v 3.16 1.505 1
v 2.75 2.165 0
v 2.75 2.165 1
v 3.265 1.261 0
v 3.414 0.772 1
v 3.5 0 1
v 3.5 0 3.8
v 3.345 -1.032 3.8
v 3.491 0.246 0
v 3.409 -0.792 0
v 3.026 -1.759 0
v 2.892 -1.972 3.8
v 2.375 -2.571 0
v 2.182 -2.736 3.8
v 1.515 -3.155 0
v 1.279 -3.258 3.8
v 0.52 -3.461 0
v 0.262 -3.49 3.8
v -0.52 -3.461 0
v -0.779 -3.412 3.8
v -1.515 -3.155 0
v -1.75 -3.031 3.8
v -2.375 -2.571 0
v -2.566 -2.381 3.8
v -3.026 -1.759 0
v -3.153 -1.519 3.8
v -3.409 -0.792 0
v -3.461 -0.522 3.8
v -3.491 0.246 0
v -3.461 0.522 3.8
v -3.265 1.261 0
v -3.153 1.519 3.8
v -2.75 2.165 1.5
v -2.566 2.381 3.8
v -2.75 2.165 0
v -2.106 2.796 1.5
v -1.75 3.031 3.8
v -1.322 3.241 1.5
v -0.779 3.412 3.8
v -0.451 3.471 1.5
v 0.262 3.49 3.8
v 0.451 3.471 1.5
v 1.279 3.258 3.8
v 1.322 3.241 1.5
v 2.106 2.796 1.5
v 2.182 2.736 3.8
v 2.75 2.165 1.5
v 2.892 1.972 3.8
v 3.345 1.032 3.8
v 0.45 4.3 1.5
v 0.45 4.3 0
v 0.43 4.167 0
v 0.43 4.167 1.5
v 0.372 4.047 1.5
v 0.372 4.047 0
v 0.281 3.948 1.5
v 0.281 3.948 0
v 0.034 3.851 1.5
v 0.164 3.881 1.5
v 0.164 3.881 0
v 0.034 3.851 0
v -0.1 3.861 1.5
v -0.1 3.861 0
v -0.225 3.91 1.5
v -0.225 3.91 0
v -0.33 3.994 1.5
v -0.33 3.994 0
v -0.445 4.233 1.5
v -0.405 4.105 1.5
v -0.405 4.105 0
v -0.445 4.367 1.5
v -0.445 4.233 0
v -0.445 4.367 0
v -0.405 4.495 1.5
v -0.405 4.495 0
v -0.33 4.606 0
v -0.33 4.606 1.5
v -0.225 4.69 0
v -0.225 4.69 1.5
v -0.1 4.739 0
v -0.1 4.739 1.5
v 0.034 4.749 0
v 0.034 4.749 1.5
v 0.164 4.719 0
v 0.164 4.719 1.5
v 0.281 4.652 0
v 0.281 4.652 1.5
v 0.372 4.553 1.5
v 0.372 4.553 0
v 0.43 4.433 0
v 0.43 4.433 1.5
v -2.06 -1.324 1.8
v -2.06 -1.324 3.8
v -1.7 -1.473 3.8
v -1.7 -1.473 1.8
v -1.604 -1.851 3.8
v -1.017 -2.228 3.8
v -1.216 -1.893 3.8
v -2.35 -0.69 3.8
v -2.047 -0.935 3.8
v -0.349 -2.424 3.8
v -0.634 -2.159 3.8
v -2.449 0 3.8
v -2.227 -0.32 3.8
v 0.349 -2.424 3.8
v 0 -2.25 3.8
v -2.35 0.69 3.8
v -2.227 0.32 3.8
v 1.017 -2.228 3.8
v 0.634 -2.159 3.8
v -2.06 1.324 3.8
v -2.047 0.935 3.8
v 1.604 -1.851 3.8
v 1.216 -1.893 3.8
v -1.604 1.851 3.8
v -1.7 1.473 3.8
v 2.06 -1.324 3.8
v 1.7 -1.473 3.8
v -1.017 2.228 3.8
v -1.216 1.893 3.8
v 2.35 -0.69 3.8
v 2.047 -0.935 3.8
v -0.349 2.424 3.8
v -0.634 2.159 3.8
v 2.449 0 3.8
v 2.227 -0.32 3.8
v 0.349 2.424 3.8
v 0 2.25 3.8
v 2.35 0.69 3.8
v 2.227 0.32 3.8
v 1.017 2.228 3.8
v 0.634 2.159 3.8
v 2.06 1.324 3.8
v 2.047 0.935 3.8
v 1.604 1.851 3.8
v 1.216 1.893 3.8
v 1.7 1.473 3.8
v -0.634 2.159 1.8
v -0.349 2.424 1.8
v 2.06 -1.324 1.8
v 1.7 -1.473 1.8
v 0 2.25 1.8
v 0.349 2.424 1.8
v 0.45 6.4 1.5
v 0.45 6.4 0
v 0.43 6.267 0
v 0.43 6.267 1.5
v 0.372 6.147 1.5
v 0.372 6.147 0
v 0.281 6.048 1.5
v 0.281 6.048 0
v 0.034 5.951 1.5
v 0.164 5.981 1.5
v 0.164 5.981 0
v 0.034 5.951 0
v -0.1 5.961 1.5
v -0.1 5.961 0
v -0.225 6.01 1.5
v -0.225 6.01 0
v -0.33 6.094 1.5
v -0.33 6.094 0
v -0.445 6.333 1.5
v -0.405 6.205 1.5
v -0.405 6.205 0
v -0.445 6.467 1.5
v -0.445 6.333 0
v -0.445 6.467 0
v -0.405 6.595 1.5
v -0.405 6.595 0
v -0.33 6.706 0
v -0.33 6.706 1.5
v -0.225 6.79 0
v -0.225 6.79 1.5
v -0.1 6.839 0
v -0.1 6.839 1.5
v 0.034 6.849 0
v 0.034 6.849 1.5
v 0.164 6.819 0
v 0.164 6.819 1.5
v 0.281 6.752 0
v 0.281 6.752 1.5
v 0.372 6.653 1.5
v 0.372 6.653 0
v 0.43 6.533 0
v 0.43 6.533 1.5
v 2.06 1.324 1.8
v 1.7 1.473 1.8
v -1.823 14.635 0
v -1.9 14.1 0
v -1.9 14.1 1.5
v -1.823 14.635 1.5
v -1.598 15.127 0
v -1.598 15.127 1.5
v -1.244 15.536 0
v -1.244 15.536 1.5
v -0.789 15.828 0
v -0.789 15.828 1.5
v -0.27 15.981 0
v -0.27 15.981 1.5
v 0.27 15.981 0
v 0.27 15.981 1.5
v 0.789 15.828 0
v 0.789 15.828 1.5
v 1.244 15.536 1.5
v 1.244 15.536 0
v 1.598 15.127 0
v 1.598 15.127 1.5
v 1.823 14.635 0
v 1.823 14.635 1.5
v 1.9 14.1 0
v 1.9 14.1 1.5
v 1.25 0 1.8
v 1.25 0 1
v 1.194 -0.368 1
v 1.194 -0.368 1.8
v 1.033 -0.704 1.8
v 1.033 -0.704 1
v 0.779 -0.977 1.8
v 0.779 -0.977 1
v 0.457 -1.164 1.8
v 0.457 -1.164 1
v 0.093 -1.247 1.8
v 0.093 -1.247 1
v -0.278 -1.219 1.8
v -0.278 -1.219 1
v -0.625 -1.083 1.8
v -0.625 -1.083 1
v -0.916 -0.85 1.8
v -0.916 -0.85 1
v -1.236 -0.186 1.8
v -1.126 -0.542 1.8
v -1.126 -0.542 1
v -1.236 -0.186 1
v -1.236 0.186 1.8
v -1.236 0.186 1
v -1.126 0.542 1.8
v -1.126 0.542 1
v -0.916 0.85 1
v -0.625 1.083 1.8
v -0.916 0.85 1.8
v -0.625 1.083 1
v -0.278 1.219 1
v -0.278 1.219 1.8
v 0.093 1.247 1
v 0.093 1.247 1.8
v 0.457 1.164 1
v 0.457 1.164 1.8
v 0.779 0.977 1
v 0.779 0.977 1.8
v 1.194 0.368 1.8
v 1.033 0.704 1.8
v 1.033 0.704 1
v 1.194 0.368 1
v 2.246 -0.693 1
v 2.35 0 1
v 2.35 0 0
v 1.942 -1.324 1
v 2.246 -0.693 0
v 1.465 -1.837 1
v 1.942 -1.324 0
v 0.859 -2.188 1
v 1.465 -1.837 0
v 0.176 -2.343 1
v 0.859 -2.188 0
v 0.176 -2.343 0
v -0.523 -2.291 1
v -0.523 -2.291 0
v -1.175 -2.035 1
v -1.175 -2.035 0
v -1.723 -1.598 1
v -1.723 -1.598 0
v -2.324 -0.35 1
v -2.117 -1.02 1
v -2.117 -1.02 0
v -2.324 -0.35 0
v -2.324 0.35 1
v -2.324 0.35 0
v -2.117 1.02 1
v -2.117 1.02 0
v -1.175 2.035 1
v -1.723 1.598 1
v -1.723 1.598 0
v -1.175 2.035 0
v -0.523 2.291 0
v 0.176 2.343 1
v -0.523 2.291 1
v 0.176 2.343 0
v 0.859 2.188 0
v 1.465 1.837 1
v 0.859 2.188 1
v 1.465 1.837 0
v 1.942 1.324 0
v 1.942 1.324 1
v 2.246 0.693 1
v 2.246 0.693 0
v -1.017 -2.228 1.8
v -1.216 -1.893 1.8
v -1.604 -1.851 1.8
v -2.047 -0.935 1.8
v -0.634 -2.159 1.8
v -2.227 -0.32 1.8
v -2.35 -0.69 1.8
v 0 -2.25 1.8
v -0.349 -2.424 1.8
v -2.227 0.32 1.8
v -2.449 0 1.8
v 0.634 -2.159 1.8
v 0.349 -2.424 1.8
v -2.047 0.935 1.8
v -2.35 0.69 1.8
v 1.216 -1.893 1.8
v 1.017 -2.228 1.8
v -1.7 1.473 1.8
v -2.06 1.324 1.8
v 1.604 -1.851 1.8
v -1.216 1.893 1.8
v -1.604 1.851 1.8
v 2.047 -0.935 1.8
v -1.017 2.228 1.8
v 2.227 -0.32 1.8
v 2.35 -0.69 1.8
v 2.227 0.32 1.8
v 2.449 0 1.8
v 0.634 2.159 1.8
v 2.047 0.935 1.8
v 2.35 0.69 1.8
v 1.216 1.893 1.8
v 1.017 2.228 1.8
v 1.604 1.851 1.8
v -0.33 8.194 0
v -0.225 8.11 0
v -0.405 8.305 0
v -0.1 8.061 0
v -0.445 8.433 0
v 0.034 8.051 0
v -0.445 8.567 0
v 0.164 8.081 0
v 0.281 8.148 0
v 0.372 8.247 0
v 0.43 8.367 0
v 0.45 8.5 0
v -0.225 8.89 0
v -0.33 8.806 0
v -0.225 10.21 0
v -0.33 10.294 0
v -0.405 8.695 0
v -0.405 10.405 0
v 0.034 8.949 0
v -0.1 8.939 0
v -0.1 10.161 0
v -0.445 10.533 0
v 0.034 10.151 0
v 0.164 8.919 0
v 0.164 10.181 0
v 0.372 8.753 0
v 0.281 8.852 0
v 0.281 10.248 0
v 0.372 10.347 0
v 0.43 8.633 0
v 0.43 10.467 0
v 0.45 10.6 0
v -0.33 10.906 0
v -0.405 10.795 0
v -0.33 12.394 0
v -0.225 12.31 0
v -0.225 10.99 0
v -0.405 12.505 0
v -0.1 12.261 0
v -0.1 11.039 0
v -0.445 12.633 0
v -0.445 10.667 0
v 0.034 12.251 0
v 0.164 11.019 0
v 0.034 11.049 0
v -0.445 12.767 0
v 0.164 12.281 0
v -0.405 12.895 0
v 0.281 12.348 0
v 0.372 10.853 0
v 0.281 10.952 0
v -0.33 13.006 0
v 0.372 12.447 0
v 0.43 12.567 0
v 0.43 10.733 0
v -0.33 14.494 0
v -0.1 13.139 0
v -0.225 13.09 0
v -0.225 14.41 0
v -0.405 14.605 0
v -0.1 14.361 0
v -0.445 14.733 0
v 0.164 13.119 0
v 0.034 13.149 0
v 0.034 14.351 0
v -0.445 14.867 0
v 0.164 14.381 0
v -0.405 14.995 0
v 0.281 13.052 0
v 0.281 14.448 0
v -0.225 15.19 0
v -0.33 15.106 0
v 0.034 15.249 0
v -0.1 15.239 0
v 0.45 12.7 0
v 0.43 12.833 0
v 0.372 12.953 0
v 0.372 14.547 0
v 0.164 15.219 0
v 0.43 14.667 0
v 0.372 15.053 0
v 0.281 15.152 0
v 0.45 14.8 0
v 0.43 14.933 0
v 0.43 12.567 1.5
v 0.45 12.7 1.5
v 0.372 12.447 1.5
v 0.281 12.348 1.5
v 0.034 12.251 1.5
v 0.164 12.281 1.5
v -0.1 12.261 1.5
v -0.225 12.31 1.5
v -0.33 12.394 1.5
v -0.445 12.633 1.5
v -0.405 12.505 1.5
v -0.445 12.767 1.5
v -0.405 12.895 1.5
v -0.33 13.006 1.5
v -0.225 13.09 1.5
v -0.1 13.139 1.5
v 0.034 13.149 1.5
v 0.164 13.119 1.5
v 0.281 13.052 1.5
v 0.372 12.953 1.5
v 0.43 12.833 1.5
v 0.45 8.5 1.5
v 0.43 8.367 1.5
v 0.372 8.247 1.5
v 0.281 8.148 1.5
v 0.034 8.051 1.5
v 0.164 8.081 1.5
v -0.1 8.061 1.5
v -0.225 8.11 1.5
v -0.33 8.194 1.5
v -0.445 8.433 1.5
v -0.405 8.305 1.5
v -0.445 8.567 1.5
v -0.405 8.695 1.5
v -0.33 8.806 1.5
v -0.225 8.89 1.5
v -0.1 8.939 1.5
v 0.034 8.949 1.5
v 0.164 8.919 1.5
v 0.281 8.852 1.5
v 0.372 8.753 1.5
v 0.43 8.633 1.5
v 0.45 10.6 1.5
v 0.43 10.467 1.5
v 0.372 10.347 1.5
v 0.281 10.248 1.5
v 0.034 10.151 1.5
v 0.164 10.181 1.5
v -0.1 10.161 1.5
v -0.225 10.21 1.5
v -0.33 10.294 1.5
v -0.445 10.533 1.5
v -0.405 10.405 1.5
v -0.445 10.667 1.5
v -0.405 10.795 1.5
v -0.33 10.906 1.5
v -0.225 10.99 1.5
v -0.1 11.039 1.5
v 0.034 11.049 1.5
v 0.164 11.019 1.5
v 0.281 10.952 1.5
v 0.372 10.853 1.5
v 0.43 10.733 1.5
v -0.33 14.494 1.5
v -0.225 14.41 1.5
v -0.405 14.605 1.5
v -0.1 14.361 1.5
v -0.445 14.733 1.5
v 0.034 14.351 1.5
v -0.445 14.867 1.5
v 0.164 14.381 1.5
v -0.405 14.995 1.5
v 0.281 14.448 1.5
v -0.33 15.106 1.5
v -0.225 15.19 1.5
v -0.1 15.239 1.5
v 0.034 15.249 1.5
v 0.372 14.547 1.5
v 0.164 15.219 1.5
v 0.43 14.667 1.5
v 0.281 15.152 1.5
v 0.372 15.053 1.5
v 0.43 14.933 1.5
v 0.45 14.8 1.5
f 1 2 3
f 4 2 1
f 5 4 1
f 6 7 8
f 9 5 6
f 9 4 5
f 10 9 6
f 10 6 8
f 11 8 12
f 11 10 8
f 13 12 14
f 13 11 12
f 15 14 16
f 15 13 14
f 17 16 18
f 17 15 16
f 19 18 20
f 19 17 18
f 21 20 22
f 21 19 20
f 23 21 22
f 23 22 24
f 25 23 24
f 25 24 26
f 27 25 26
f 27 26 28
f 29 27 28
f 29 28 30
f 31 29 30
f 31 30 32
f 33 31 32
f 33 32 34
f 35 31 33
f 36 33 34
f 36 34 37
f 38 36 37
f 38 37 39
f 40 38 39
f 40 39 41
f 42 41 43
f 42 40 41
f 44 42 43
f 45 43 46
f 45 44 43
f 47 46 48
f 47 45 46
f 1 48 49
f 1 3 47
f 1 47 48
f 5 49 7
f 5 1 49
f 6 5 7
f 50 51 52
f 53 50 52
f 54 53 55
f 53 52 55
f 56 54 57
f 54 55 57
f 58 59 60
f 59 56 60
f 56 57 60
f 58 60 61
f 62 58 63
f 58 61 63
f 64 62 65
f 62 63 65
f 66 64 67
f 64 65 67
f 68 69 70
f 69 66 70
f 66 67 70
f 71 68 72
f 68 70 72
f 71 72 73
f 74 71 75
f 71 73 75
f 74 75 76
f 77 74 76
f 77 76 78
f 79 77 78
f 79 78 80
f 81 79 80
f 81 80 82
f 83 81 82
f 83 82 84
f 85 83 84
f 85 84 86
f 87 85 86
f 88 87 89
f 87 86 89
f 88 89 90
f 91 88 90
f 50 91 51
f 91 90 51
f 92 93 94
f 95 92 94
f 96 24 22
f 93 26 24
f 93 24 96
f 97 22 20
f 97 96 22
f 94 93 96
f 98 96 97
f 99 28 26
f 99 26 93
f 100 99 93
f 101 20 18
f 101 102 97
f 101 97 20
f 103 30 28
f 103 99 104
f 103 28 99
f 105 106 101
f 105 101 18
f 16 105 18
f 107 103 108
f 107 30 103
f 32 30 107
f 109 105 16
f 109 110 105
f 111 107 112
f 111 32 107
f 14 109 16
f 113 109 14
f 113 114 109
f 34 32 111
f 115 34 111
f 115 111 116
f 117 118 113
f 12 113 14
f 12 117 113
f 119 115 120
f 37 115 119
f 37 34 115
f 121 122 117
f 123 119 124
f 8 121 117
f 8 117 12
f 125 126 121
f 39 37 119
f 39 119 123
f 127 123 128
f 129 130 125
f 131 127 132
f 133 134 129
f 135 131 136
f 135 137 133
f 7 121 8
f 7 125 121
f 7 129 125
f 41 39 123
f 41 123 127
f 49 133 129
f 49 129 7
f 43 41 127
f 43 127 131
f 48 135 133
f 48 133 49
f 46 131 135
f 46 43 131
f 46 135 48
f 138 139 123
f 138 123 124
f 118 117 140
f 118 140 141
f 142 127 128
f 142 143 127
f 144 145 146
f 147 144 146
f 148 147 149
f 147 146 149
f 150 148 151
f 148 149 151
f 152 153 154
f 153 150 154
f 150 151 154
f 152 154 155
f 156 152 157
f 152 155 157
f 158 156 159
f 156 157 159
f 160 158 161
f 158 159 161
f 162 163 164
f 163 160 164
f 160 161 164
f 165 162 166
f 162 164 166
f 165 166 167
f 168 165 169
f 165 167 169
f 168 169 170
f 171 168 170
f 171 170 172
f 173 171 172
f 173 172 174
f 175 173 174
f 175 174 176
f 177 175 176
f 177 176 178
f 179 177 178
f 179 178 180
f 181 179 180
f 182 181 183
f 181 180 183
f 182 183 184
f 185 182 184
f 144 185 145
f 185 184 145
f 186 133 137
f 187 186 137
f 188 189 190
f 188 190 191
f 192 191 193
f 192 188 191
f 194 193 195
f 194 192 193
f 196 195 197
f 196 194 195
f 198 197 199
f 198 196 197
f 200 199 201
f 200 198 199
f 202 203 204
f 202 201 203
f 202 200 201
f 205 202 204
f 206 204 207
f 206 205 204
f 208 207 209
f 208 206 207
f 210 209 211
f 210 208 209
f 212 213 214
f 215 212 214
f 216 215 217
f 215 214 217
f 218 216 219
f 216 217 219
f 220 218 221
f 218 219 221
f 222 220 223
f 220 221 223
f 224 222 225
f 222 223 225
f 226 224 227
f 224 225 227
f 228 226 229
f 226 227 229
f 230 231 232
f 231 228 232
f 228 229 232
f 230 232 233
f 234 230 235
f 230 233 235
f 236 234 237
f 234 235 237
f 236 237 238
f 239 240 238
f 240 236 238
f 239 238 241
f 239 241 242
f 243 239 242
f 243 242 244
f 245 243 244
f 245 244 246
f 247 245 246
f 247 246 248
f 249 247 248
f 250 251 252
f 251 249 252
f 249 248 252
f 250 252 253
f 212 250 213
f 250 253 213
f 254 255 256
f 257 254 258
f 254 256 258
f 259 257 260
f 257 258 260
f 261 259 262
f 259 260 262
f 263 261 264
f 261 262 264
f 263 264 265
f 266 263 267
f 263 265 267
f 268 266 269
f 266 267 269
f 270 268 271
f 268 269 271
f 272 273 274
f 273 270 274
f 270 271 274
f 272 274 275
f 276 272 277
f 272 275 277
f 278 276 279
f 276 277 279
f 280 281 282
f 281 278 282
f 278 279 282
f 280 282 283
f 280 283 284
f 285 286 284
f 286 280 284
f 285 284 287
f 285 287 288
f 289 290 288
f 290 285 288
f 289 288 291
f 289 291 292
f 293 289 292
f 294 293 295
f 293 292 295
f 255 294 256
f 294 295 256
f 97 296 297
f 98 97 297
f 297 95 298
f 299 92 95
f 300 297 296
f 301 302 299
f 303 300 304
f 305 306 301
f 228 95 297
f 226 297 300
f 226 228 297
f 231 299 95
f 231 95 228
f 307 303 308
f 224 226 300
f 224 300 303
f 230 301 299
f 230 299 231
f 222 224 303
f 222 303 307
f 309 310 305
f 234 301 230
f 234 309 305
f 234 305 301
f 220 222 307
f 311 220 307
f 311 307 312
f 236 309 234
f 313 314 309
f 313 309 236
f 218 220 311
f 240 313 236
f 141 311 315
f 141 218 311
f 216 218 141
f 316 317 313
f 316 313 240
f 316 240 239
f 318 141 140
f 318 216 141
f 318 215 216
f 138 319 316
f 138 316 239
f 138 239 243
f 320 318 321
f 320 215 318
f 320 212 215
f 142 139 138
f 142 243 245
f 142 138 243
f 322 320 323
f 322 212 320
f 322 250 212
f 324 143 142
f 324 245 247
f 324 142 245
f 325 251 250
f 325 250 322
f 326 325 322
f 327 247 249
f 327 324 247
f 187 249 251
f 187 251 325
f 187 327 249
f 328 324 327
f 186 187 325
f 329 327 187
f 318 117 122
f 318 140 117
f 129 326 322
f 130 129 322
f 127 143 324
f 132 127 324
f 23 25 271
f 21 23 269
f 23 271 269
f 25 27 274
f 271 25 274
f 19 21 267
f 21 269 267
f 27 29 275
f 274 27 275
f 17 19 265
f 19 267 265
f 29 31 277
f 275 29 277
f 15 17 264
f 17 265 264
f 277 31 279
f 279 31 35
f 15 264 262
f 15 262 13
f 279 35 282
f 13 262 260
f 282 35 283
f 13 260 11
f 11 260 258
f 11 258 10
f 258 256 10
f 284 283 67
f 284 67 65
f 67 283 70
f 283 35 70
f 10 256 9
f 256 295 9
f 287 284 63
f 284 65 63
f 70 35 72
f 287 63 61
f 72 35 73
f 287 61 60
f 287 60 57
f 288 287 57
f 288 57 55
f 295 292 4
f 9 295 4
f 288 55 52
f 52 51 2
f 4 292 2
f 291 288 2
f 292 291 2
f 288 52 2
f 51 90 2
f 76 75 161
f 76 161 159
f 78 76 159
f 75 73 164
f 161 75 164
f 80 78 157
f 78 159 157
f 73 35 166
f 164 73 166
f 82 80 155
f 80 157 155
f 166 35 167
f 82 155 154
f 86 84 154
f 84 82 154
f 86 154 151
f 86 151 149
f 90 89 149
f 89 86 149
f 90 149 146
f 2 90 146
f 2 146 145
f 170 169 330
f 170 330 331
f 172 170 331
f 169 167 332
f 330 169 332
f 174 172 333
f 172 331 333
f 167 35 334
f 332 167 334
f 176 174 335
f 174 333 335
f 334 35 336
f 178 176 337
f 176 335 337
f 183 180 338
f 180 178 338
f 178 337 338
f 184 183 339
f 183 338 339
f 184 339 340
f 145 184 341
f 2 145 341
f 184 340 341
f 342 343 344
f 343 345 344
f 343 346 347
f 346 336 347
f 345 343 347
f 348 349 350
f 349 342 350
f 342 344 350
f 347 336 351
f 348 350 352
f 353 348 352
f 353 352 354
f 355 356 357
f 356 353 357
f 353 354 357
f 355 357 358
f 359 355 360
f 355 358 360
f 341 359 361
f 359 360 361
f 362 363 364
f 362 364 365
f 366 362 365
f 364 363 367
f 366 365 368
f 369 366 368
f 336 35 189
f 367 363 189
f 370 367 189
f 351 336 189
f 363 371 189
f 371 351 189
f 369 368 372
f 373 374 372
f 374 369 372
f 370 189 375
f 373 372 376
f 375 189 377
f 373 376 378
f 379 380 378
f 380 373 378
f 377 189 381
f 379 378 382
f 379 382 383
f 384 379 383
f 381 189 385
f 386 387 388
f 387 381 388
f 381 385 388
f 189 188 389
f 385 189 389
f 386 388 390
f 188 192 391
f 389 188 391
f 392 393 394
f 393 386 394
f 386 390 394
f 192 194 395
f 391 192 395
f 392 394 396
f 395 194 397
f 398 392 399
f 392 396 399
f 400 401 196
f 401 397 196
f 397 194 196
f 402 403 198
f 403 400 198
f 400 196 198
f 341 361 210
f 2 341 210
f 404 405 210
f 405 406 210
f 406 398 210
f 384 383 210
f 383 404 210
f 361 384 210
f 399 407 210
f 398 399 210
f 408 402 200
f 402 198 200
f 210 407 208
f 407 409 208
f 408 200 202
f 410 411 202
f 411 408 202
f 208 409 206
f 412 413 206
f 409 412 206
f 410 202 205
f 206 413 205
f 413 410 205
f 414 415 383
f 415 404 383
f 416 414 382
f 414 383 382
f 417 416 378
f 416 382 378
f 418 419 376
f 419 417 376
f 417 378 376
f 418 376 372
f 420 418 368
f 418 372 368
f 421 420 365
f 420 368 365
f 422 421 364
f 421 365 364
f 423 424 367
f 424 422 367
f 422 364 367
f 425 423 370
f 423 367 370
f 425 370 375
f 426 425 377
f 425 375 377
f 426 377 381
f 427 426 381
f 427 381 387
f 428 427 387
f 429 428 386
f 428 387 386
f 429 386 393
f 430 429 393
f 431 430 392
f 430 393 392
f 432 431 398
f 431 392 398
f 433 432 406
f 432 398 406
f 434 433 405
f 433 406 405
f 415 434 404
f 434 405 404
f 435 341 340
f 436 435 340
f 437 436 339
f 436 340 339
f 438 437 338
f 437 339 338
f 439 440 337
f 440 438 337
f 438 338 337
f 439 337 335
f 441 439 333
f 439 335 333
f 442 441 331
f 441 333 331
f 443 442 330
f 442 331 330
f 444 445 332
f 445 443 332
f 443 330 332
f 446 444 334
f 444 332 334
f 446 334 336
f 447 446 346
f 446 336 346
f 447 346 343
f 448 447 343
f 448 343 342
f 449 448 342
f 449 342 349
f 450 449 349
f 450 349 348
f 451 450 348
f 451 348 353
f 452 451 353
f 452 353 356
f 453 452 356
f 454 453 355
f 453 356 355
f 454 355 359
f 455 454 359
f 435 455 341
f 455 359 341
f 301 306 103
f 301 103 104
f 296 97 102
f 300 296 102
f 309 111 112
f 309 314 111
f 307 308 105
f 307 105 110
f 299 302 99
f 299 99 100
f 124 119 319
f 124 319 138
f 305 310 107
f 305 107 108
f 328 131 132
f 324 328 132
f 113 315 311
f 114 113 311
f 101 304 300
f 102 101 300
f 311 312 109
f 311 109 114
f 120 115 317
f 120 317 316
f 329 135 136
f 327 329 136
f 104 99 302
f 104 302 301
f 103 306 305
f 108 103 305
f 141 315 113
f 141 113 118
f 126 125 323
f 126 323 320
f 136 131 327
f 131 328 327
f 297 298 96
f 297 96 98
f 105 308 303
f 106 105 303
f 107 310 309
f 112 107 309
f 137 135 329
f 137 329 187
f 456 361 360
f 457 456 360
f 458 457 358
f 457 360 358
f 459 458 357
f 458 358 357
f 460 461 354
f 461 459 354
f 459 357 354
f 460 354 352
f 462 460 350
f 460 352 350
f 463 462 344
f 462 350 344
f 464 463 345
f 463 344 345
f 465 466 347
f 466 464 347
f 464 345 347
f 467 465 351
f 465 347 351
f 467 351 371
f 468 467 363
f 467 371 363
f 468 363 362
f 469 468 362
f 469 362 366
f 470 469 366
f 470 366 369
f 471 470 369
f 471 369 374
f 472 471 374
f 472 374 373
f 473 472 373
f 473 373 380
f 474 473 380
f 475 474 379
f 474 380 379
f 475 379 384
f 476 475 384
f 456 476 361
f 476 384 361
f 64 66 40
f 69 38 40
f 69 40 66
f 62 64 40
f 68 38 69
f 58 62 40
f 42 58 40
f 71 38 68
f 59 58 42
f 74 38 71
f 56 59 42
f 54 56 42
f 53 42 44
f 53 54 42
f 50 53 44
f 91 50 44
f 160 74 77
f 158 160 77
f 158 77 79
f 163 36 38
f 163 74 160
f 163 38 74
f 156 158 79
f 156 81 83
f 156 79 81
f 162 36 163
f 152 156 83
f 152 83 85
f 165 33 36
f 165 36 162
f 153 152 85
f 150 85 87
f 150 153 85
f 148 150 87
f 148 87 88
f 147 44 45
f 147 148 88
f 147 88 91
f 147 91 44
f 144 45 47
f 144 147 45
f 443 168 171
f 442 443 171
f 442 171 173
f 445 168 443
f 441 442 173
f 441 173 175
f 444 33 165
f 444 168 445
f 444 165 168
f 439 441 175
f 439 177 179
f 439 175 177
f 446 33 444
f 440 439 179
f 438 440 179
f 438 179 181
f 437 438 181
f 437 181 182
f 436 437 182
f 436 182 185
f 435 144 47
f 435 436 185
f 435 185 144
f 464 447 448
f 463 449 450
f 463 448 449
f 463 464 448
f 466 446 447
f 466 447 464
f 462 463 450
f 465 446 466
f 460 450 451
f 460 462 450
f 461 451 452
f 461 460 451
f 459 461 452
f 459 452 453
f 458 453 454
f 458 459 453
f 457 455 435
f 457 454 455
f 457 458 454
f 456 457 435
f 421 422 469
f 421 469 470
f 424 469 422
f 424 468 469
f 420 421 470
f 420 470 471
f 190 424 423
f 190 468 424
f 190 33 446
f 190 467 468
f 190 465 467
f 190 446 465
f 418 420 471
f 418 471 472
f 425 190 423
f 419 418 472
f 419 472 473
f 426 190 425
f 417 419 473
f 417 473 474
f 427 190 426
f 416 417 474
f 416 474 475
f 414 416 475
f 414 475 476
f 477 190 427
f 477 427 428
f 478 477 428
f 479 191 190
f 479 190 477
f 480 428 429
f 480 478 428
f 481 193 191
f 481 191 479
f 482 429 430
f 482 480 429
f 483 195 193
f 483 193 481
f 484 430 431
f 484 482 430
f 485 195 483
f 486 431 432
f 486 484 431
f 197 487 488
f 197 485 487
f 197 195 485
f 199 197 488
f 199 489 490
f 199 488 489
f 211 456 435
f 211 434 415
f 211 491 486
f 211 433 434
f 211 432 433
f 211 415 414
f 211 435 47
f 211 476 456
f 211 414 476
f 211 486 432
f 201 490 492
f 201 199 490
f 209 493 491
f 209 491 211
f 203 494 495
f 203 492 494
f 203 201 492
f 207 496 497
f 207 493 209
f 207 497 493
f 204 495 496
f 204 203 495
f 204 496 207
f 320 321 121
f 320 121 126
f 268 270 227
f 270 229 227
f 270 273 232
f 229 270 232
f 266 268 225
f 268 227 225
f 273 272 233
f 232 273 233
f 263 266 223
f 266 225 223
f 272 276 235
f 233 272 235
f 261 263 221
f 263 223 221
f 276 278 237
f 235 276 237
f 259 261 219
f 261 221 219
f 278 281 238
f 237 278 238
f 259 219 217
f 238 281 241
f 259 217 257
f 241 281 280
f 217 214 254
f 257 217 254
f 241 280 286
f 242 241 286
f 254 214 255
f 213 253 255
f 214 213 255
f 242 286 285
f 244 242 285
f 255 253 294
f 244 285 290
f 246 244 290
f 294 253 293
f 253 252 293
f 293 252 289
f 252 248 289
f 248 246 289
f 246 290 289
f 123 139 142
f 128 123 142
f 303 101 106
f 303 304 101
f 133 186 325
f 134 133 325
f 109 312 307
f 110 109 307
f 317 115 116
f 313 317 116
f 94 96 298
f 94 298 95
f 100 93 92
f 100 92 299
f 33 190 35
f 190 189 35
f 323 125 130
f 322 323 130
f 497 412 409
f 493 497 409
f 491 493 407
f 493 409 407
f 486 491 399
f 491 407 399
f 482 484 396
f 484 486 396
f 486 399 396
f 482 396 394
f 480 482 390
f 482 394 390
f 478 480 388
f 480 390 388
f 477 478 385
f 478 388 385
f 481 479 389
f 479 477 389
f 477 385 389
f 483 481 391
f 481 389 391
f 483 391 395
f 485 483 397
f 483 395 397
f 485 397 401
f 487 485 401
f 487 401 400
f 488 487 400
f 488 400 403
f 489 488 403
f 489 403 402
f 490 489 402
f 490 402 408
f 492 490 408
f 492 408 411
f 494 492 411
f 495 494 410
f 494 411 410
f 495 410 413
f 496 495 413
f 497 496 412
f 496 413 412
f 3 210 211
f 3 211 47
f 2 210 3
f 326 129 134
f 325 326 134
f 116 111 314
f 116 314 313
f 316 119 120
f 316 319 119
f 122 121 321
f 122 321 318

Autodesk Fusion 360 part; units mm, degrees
sketch "スケッチ1" plane through (0, 0, 0) normal (0, 0, 1) x (1, 0, 0)
  circle A0 centre (0, 0) radius 2.45
  circle A1 centre (0, 0) radius 3.5
  line L0 (-3.5, 0) -> (3.5, 0) construction
  line L1 (0, 3.5) -> (0, -3.5) construction
  line L2 (-0.35, 2.4249) -> (0, 2.25)
  line L3 (0.35, 2.4249) -> (0, 2.25)
  line L4 (-0.35, 2.4249) -> (0.35, 2.4249) construction
  line L5 (0, 2.45) -> (0, 2.25) construction
  circle A2 centre (0, 0) radius 1.25
  line L6 (0, 3.5) -> (0, 16) construction
  line L7 (-2.75, 2.1651) -> (2.75, 2.1651) construction
  circle A3 centre (0, 14.1) radius 1.9
  line L8 (-1.9, 14.1) -> (1.9, 14.1) construction
  line L9 (-1.9, 14.1) -> (-2.75, 2.1651)
  line L10 (1.9, 14.1) -> (2.75, 2.1651)
  circle A4 centre (0, 14.8) radius 0.45
  circle A5 centre (0, 12.7) radius 0.45
  circle A6 centre (0, 10.6) radius 0.45
  circle A7 centre (0, 8.5) radius 0.45
  circle A8 centre (0, 6.4) radius 0.45
  circle A9 centre (0, 4.3) radius 0.45
  circle A10 centre (0, 0) radius 2.35
  dimension "d1" = 4.9
  dimension "d2" = 7
  dimension "d3" = 0.2
  dimension "d4" = 0.7
  dimension "d5" = 2.5
  dimension "d7" = 3.8
  dimension "d8" = 19.5
  dimension "d9" = 5.5
  dimension "d10" = 0.9
  dimension "d12" = 2.1
  dimension "d13" = 2.1
  dimension "d14" = 2.1
  dimension "d15" = 2.1
  dimension "d16" = 2.1
  dimension "d18" = 4.7
  dimension "d21" = 1.2
extrude "押し出し1" add sketch "スケッチ1" along normal blind 1 contours A0 L2 L3 A10 | A0 L2 L3 A10 | A1 | A1 A3 L9 L10 | A3
extrude "押し出し2" add sketch "スケッチ1" along normal blind 1.5 contours A1 A3 L9 L10 | A3
extrude "押し出し3" add sketch "スケッチ1" along normal blind 0.8 from surface at 1 contours A0 L2 L3 A10 | A0 L2 L3 A10 | L2 L3 A10 | L2 L3 A10 | A1
extrude "押し出し4" add sketch "スケッチ1" along normal blind 2 from surface at 1.8 contours A1
extrude "押し出し5" add sketch "スケッチ1" along normal blind 2 from surface at 1.8 contours A0 L2 L3 A10 | L2 L3 A10 picked at (-0.2175, 2.4049) picked at (0, 2.3161)
pattern_circular "C パターン1" count 22 over 360 about axis through (0, 0, 1.75) along (0, 0, 1) of "押し出し5"
